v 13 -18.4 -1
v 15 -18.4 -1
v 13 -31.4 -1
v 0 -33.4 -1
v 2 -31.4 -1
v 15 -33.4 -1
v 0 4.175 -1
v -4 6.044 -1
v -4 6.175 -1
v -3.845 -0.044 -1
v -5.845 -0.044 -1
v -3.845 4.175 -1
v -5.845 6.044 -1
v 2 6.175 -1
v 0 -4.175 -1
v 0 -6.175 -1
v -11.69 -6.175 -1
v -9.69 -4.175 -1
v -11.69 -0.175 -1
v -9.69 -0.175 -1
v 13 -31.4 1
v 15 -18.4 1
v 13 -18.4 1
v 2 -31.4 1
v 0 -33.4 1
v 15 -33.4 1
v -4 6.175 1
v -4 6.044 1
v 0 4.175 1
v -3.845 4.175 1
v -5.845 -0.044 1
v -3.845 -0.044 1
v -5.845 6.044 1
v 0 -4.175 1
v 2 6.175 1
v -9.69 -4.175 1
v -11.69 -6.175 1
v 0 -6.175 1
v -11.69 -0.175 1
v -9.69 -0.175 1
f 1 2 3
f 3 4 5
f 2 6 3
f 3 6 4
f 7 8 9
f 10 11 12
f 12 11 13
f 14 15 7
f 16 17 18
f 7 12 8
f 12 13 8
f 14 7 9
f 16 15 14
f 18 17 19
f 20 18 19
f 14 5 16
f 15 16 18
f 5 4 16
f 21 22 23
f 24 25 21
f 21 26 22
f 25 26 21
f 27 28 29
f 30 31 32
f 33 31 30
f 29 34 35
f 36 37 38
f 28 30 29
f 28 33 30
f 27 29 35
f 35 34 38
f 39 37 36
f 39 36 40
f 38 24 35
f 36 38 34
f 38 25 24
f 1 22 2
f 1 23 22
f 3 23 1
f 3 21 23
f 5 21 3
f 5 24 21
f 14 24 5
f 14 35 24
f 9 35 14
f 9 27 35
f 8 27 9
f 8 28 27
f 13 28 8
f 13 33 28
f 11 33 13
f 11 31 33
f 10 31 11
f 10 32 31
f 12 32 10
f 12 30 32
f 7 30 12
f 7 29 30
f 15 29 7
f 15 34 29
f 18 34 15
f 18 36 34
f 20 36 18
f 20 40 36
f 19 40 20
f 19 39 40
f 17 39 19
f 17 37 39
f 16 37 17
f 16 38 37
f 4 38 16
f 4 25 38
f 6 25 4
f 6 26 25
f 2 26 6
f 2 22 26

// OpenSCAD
//Lip measurements
LIP_HEIGHT = 8.35;
LIP_WIDTH = 9.69;

// Hook Measurements
HOOK_HEIGHT = 4*LIP_HEIGHT;
HOOK_WIDTH = 15;

// Thickness of the piece
PADDING = 2;

// Universal Measurements
DEPTH=2;

// create the lip
//square([LIP_WIDTH+PADDING, LIP_HEIGHT+PADDING], false);

// Create the hook.
module hook() {
    difference() {
        square([HOOK_WIDTH, HOOK_HEIGHT], false);
            translate([PADDING,PADDING,0]) {
                square([HOOK_WIDTH-2*PADDING, HOOK_HEIGHT], false);
            }
        translate([PADDING*2,HOOK_WIDTH,0]) {
            square([HOOK_HEIGHT, HOOK_HEIGHT],false);
        }
    }
}

module lip() {
    union() {
        difference() {
            square([LIP_WIDTH+2*PADDING, LIP_HEIGHT+2*PADDING], true);
            square([LIP_WIDTH, LIP_HEIGHT], true);
            translate([-PADDING*2,PADDING*2,0]) {
                square([LIP_WIDTH, LIP_HEIGHT], true);
            }
        }
        
        translate([0,PADDING+PADDING/2,0]) {
            square([PADDING,LIP_HEIGHT/4+2*PADDING], true);
        }
    }
}




module component(depth=DEPTH) {
    linear_extrude(height = depth, center = true) {
        translate([-LIP_WIDTH/2,0,0]) {
            lip();
        }
        translate([0,-HOOK_HEIGHT,0]) {
            hook();
        }
    }
}

component();
